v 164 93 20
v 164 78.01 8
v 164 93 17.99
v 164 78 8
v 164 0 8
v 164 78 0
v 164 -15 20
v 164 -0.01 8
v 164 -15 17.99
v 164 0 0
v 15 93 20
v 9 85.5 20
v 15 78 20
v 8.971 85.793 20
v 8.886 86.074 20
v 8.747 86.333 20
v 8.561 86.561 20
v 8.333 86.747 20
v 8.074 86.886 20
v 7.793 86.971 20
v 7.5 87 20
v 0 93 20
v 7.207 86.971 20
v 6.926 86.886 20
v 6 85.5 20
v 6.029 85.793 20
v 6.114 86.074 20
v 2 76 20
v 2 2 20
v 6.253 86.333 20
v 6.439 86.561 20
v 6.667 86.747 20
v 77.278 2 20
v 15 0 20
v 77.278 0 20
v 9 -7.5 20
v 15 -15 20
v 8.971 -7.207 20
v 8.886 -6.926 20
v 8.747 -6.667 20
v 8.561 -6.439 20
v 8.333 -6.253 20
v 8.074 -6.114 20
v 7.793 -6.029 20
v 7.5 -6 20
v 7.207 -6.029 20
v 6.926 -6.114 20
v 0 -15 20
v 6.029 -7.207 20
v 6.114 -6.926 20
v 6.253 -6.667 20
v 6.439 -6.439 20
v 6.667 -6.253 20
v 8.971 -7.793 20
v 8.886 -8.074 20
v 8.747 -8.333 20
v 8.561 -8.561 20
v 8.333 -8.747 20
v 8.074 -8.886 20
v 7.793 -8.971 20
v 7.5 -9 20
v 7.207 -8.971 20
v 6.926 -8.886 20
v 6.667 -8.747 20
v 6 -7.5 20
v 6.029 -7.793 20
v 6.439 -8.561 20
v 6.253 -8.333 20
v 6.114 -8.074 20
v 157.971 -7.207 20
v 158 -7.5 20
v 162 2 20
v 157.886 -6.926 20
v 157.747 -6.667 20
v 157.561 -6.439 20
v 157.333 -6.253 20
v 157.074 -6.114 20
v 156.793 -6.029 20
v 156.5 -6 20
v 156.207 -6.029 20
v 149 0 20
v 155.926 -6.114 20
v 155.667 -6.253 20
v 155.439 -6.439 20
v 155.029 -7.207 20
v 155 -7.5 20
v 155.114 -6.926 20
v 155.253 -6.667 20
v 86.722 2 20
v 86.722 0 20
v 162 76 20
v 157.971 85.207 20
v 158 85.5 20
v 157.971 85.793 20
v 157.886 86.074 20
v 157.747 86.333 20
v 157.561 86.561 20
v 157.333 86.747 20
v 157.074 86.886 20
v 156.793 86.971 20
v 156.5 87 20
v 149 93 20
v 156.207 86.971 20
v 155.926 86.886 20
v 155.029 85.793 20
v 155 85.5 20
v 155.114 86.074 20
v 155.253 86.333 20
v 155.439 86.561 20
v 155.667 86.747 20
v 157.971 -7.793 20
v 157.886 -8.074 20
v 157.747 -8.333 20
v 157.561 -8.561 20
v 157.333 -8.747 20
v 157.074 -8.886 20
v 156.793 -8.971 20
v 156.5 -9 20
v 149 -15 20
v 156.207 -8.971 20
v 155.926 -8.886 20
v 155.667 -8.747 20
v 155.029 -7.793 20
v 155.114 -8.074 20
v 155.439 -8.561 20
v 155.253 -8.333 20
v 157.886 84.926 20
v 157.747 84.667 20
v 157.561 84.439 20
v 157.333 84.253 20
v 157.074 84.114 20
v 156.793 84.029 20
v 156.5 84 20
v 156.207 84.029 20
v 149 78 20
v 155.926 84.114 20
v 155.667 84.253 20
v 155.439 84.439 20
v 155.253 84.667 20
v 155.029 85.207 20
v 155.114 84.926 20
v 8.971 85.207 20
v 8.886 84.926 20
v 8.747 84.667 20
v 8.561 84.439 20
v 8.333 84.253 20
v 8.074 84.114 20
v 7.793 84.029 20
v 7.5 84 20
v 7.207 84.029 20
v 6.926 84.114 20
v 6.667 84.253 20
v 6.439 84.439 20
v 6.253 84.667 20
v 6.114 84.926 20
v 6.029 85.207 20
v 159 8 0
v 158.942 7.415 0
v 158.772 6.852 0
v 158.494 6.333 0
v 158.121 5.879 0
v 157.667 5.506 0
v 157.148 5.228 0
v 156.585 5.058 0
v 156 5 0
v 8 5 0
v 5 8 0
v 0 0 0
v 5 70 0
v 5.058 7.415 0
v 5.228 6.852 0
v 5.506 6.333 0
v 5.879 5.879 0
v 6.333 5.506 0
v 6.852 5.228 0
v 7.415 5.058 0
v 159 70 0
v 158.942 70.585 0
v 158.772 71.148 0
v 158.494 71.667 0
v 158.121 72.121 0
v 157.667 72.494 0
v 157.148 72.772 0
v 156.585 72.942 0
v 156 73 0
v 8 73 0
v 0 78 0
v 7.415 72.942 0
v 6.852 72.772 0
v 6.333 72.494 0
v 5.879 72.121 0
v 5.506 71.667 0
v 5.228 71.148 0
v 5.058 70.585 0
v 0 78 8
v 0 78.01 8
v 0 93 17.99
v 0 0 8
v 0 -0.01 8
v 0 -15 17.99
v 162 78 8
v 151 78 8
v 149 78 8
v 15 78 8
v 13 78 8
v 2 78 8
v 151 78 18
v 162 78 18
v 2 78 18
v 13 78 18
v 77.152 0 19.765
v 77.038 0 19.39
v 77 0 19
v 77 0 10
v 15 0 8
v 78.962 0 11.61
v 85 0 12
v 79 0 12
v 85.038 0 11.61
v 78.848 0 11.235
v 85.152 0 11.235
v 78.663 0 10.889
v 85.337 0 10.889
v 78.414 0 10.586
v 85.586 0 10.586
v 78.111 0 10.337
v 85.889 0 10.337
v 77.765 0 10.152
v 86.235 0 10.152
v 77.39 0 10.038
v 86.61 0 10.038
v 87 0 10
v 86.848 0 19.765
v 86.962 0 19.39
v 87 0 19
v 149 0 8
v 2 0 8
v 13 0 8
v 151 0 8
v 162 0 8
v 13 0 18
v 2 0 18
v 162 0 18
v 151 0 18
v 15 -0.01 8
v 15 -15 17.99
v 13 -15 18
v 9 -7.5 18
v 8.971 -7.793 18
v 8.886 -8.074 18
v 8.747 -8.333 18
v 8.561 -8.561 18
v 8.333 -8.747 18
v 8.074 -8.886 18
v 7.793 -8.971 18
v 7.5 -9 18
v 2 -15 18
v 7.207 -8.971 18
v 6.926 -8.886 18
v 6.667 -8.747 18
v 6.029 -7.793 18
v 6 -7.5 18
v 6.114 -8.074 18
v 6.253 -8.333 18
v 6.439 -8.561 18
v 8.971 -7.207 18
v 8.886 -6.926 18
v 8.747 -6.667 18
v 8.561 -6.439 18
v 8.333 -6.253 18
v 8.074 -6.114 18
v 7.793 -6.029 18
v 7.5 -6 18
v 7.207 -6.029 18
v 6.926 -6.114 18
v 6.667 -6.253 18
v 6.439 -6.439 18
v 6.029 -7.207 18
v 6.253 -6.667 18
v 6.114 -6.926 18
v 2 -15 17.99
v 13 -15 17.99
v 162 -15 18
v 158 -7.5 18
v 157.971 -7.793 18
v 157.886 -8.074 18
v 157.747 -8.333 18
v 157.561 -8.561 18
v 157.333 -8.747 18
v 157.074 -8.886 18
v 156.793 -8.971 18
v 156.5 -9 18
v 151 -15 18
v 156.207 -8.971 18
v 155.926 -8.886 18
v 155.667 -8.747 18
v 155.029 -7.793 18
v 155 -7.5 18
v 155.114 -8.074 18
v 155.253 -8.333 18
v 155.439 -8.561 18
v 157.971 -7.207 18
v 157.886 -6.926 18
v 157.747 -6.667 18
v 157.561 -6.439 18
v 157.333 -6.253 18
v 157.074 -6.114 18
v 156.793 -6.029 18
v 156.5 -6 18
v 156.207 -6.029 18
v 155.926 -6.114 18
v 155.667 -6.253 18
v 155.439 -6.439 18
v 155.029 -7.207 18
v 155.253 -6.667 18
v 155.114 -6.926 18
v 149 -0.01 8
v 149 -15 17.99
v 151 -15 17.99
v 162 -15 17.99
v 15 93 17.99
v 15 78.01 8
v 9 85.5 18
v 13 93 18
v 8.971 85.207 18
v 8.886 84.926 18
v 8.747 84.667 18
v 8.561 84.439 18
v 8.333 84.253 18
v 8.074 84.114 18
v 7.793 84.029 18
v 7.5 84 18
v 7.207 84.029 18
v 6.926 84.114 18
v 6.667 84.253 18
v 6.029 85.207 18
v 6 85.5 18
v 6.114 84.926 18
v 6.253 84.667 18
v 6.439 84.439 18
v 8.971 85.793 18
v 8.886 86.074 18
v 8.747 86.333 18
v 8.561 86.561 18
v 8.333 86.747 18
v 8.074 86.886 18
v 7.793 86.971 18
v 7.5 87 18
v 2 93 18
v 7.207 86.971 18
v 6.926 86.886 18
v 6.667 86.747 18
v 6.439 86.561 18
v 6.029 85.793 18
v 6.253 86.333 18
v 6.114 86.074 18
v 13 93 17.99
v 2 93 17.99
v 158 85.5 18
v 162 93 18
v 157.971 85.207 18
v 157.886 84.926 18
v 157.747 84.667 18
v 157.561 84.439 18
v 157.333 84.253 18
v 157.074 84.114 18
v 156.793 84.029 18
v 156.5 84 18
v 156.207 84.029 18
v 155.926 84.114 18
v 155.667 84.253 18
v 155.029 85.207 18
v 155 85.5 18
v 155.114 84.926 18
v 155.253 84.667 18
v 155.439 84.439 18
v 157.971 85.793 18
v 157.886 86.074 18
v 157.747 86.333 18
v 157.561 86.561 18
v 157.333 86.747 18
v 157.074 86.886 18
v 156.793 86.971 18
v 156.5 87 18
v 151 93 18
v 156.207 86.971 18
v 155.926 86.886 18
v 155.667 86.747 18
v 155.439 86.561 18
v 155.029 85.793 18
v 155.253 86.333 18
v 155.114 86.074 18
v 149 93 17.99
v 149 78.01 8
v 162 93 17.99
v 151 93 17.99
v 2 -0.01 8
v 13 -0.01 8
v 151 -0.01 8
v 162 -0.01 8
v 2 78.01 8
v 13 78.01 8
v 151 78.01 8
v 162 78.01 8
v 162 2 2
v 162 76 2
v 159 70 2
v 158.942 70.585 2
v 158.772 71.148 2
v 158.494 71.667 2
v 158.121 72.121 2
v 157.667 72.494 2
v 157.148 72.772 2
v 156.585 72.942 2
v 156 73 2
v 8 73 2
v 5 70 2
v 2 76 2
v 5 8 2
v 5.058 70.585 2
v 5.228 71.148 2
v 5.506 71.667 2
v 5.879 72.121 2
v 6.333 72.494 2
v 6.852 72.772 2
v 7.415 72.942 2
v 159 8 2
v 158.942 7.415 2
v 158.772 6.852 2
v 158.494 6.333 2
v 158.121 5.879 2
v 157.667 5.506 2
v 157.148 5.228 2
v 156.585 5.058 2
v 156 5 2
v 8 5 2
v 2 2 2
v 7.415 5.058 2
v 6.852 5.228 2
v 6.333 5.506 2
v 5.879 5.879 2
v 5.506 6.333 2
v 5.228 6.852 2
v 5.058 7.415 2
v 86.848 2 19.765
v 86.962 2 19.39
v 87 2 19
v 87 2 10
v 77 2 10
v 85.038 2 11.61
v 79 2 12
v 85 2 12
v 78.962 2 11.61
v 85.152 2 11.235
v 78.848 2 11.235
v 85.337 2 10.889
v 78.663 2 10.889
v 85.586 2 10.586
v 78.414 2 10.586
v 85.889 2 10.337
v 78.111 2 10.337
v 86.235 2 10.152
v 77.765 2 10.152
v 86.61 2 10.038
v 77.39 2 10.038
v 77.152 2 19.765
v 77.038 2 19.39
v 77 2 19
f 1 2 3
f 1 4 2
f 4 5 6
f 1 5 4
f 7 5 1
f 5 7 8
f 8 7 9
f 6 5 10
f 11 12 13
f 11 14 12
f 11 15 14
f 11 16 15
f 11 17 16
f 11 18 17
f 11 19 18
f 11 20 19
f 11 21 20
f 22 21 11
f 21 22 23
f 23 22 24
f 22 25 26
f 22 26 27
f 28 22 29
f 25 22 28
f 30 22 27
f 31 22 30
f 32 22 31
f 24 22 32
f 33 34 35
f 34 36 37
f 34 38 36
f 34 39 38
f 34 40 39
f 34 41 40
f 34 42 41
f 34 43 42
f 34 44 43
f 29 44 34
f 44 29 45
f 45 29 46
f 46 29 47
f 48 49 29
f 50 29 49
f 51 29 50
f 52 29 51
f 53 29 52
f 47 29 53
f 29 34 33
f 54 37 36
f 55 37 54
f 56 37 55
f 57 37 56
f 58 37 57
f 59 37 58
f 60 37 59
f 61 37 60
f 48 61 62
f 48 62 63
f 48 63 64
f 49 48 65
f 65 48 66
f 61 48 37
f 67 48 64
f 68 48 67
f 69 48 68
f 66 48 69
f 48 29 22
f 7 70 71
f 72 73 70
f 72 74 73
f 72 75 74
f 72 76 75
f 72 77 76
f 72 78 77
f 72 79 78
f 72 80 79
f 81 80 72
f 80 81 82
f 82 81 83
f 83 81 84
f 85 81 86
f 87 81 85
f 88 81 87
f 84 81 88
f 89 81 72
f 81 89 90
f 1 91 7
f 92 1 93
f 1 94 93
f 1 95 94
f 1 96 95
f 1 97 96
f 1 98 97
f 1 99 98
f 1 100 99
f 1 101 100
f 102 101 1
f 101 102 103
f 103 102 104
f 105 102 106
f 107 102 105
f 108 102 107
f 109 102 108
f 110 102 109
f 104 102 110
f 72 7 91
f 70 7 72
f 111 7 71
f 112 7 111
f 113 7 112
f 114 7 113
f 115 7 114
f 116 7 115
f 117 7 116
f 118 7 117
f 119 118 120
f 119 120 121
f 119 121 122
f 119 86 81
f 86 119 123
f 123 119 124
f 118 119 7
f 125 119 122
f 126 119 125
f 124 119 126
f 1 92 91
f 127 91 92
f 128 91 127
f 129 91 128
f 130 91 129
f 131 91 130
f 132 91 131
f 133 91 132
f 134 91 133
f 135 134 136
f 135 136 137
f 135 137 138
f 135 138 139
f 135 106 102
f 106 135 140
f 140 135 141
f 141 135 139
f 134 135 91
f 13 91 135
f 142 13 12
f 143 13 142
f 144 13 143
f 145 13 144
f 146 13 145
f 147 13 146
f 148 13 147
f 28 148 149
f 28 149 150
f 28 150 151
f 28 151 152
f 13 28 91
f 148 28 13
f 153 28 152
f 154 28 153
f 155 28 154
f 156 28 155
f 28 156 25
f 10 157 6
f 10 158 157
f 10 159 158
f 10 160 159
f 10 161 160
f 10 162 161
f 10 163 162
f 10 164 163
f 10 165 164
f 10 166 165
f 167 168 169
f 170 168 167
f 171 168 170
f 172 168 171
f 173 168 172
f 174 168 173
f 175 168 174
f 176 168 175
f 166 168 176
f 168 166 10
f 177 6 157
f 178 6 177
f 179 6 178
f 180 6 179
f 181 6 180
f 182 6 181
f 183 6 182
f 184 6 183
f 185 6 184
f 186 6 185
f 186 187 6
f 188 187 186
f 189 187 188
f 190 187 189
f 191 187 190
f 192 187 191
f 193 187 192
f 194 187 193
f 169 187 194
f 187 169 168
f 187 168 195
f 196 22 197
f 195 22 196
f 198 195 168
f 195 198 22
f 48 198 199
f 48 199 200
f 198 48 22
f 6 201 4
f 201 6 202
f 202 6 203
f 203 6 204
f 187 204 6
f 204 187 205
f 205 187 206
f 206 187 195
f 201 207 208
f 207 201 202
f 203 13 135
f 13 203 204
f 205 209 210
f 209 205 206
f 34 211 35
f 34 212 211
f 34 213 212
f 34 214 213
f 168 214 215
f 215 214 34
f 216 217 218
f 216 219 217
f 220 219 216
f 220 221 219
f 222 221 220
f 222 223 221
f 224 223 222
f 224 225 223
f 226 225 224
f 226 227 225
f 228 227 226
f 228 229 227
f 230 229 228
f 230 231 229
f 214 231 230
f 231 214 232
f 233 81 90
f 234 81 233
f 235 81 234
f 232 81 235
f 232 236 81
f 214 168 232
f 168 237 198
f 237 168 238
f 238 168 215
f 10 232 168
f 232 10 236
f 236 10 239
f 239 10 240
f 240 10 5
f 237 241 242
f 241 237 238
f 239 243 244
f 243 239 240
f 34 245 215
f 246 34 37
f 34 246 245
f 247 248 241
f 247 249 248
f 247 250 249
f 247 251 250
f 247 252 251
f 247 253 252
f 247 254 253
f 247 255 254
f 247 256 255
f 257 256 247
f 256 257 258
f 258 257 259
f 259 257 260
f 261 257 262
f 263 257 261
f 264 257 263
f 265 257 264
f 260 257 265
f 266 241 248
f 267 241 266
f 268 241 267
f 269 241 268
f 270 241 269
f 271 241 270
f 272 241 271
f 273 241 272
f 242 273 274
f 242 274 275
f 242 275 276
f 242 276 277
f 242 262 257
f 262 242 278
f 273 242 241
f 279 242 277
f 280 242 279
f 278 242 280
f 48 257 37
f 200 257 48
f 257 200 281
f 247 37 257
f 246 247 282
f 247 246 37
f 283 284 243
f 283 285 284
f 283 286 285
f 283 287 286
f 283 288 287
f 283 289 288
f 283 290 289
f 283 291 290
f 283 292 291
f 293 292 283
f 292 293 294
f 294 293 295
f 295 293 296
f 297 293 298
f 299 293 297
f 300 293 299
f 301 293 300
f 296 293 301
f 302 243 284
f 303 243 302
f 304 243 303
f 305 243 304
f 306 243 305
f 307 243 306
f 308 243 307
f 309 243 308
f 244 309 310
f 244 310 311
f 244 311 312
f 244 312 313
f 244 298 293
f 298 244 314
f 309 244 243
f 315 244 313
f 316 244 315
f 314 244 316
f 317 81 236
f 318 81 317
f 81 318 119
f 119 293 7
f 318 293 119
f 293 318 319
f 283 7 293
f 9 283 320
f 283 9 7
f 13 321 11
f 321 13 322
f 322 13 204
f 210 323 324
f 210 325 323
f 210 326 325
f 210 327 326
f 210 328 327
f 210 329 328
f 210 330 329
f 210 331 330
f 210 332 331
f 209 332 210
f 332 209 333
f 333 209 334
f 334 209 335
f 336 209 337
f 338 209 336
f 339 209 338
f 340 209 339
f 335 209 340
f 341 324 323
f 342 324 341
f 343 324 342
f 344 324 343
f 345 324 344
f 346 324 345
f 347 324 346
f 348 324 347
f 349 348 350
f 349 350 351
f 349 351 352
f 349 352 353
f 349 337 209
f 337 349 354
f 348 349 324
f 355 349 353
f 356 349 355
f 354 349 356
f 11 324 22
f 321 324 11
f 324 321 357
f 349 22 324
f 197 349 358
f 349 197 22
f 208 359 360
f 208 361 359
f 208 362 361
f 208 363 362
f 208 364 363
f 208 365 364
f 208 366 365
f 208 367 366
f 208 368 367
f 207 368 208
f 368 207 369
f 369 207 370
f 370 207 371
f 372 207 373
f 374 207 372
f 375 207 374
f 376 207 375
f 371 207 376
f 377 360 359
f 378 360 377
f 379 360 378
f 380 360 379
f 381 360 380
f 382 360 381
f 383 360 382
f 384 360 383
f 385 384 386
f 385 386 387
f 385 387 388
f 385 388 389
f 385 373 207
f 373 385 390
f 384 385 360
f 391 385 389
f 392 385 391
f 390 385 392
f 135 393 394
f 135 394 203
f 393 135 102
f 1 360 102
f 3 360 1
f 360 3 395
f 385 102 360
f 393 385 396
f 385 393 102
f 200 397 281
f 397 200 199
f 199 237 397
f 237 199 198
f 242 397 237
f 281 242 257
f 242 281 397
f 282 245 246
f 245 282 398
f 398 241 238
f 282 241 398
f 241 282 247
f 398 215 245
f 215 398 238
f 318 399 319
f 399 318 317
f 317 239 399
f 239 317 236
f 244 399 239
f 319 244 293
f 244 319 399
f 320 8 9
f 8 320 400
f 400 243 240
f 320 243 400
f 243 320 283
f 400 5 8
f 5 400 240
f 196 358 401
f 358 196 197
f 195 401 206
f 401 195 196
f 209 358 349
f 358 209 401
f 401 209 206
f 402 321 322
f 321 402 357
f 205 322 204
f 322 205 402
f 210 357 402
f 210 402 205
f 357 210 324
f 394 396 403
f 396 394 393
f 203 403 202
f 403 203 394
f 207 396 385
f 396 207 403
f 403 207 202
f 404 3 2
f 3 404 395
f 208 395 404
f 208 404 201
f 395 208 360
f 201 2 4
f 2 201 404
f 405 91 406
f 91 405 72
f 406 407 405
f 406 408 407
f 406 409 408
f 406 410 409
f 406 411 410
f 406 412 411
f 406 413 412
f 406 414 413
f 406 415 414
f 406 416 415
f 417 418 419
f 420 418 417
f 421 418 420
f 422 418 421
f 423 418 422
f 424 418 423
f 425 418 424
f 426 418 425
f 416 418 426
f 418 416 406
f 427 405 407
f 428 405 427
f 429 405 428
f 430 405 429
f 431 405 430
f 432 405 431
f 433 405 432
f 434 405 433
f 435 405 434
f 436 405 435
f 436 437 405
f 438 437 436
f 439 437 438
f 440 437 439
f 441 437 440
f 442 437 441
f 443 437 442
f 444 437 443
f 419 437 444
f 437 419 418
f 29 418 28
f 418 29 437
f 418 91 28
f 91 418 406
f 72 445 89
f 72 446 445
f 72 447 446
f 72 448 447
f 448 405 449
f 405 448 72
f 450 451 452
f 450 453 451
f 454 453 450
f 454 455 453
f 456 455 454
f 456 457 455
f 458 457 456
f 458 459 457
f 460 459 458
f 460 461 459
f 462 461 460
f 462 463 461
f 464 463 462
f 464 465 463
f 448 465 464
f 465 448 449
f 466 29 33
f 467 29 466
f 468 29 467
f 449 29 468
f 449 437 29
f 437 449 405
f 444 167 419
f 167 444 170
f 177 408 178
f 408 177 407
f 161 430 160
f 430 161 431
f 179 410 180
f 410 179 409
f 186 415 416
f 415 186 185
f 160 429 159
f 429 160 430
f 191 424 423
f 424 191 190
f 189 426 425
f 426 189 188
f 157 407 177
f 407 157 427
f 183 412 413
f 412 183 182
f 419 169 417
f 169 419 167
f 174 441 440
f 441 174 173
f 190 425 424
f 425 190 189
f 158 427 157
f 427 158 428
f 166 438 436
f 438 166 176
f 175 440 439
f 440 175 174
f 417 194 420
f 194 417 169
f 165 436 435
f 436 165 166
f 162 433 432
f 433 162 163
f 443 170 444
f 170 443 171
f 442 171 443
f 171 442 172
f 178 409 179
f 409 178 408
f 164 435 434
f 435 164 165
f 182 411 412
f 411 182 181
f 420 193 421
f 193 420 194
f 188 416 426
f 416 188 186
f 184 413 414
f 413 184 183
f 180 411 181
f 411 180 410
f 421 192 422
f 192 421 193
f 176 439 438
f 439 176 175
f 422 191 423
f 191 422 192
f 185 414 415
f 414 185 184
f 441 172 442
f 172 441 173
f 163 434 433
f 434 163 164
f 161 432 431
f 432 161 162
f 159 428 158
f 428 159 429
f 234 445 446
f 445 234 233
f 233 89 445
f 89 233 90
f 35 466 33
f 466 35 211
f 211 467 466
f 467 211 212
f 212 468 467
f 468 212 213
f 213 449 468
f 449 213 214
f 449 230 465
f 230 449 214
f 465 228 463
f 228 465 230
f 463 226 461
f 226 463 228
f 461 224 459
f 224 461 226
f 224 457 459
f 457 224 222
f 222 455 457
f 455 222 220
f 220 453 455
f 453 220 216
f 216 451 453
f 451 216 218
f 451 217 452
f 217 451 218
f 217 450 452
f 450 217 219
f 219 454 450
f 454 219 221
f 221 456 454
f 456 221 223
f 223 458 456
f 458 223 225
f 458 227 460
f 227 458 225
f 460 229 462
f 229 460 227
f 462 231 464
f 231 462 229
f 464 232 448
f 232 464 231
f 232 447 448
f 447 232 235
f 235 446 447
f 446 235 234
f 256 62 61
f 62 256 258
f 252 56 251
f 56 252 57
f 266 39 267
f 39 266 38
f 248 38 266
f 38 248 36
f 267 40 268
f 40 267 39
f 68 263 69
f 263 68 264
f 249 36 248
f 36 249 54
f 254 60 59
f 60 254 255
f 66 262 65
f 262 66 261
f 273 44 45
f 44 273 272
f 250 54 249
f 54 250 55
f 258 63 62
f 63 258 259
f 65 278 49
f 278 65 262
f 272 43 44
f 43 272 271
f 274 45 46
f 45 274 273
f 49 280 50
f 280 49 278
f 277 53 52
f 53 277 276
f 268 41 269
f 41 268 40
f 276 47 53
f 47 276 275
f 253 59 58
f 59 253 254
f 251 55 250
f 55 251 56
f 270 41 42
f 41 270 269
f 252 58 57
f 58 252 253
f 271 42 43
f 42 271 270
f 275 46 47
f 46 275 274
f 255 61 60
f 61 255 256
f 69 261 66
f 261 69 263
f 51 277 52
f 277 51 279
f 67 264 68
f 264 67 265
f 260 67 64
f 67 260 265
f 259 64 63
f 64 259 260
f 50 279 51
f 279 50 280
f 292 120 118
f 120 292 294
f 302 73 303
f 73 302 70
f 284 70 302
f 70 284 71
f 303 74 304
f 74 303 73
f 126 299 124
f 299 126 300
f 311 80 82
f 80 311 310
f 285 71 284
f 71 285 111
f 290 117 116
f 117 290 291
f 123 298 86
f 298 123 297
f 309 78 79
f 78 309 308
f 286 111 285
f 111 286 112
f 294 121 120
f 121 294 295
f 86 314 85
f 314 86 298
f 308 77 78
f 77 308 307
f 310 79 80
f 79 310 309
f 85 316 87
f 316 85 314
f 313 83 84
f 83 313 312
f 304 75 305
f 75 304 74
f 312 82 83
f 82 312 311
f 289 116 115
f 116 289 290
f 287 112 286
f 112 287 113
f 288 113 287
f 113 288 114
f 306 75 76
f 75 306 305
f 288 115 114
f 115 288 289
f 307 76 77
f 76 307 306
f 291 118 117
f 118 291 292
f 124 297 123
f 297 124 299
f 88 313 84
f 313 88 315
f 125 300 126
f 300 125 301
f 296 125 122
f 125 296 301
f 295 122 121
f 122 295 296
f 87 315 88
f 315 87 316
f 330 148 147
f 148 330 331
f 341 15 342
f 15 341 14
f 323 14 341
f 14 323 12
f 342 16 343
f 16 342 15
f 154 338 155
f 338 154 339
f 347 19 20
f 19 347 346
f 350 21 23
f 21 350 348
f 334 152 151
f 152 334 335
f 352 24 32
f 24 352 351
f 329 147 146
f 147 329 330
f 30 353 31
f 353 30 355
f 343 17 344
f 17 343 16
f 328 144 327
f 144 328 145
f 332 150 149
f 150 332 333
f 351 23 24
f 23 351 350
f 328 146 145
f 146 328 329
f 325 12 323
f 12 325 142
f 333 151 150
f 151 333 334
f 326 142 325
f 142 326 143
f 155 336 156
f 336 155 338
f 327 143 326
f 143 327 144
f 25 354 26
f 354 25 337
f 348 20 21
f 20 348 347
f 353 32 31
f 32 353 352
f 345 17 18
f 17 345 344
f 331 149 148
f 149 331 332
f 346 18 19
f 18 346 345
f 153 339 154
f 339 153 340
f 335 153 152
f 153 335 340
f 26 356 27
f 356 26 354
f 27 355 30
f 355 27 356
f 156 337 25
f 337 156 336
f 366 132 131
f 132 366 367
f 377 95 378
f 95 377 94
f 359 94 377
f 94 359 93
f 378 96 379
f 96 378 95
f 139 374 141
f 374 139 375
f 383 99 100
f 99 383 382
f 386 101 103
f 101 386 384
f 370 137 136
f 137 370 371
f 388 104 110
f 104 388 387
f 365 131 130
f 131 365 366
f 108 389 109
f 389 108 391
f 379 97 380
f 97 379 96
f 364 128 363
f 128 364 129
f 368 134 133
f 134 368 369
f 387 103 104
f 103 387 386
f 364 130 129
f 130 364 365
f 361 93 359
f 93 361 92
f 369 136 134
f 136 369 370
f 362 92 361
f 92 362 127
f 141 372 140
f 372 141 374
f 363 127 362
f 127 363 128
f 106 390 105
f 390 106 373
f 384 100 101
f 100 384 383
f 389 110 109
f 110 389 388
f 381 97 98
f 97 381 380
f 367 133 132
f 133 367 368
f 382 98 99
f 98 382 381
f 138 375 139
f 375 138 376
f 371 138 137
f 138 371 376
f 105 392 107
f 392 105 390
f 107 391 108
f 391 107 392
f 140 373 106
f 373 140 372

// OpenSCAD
// Box enclosure for 160x74x18mm object

// Inner dimensions (the object to enclose)
inner_length = 160;
inner_width = 74;
inner_height = 18;

// Wall thickness
wall = 2;

// Bottom hole inset from inner walls
hole_inset = 3;

// Bottom hole corner radius
hole_corner_radius = 3;

// Side hole dimensions
side_hole_width = 10;
side_hole_height = 8;
side_hole_corner_radius = 2;

// Overhang dimensions
overhang_width = 15;
overhang_length = 15;

// Screw hole diameter
screw_hole_d = 3;

// Gusset dimensions
gusset_thickness = 2;
gusset_height = 10;

// Outer dimensions
outer_length = inner_length + 2 * wall;
outer_width = inner_width + 2 * wall;
outer_height = inner_height + wall; // wall on bottom only, open top

// Bottom hole dimensions
hole_length = inner_length - 2 * hole_inset;
hole_width = inner_width - 2 * hole_inset;

// Overhang positions along X (flush to edges)
overhang_x1 = 0;
overhang_x2 = outer_length - overhang_width;

// Rounded rectangle module
module rounded_rect(length, width, height, radius) {
    translate([radius, radius, 0])
        hull() {
            cylinder(h = height, r = radius, $fn = 32);
            translate([length - 2 * radius, 0, 0])
                cylinder(h = height, r = radius, $fn = 32);
            translate([0, width - 2 * radius, 0])
                cylinder(h = height, r = radius, $fn = 32);
            translate([length - 2 * radius, width - 2 * radius, 0])
                cylinder(h = height, r = radius, $fn = 32);
        }
}

// Door profile: top corners rounded inward, bottom corners rounded outward
module door_2d(width, height, top_r, bottom_r) {
    intersection() {
        translate([0, -bottom_r])
            square([width, height + bottom_r]);
        union() {
            // Main body with rounded top corners
            hull() {
                translate([top_r, height - top_r])
                    circle(r = top_r, $fn = 32);
                translate([width - top_r, height - top_r])
                    circle(r = top_r, $fn = 32);
                square([width, height - top_r]);
            }
            // Bottom-left outward round
            circle(r = bottom_r, $fn = 32);
            // Bottom-right outward round
            translate([width, 0])
                circle(r = bottom_r, $fn = 32);
        }
    }
}

// Gusset module: right-triangle brace
module gusset(length, height, thickness) {
    hull() {
        cube([thickness, 0.01, height]);
        translate([0, length - 0.01, height - 0.01])
            cube([thickness, 0.01, 0.01]);
    }
}

difference() {
    union() {
        // Outer shell
        cube([outer_length, outer_width, outer_height]);

        // Left side overhangs (Y=0, extending in -Y)
        translate([overhang_x1, -overhang_length, outer_height - wall])
            cube([overhang_width, overhang_length, wall]);
        translate([overhang_x2, -overhang_length, outer_height - wall])
            cube([overhang_width, overhang_length, wall]);

        // Right side overhangs (Y=outer_width, extending in +Y)
        translate([overhang_x1, outer_width, outer_height - wall])
            cube([overhang_width, overhang_length, wall]);
        translate([overhang_x2, outer_width, outer_height - wall])
            cube([overhang_width, overhang_length, wall]);

        // Gussets - left side, front overhang
        translate([overhang_x1, 0, outer_height - wall - gusset_height])
            mirror([0, 1, 0])
                gusset(overhang_length, gusset_height, gusset_thickness);
        translate([overhang_x1 + overhang_width - gusset_thickness, 0, outer_height - wall - gusset_height])
            mirror([0, 1, 0])
                gusset(overhang_length, gusset_height, gusset_thickness);

        // Gussets - left side, rear overhang
        translate([overhang_x2, 0, outer_height - wall - gusset_height])
            mirror([0, 1, 0])
                gusset(overhang_length, gusset_height, gusset_thickness);
        translate([overhang_x2 + overhang_width - gusset_thickness, 0, outer_height - wall - gusset_height])
            mirror([0, 1, 0])
                gusset(overhang_length, gusset_height, gusset_thickness);

        // Gussets - right side, front overhang
        translate([overhang_x1, outer_width, outer_height - wall - gusset_height])
            gusset(overhang_length, gusset_height, gusset_thickness);
        translate([overhang_x1 + overhang_width - gusset_thickness, outer_width, outer_height - wall - gusset_height])
            gusset(overhang_length, gusset_height, gusset_thickness);

        // Gussets - right side, rear overhang
        translate([overhang_x2, outer_width, outer_height - wall - gusset_height])
            gusset(overhang_length, gusset_height, gusset_thickness);
        translate([overhang_x2 + overhang_width - gusset_thickness, outer_width, outer_height - wall - gusset_height])
            gusset(overhang_length, gusset_height, gusset_thickness);
    }

    // Inner cavity
    translate([wall, wall, wall])
        cube([inner_length, inner_width, inner_height + 1]);

    // Rounded square hole in the bottom
    translate([wall + hole_inset, wall + hole_inset, -1])
        rounded_rect(hole_length, hole_width, wall + 2, hole_corner_radius);

    // Door hole on the front side: top rounded inward, bottom rounded outward
    translate([outer_length / 2 - side_hole_width / 2, wall + 1, outer_height - side_hole_height])
        rotate([90, 0, 0])
            linear_extrude(height = wall + 2)
                door_2d(side_hole_width, side_hole_height + 1, side_hole_corner_radius, side_hole_corner_radius);

    // Screw holes in overhangs - left side
    translate([overhang_x1 + overhang_width / 2, -overhang_length / 2, outer_height - wall - 1])
        cylinder(h = wall + 2, d = screw_hole_d, $fn = 32);
    translate([overhang_x2 + overhang_width / 2, -overhang_length / 2, outer_height - wall - 1])
        cylinder(h = wall + 2, d = screw_hole_d, $fn = 32);

    // Screw holes in overhangs - right side
    translate([overhang_x1 + overhang_width / 2, outer_width + overhang_length / 2, outer_height - wall - 1])
        cylinder(h = wall + 2, d = screw_hole_d, $fn = 32);
    translate([overhang_x2 + overhang_width / 2, outer_width + overhang_length / 2, outer_height - wall - 1])
        cylinder(h = wall + 2, d = screw_hole_d, $fn = 32);
}
